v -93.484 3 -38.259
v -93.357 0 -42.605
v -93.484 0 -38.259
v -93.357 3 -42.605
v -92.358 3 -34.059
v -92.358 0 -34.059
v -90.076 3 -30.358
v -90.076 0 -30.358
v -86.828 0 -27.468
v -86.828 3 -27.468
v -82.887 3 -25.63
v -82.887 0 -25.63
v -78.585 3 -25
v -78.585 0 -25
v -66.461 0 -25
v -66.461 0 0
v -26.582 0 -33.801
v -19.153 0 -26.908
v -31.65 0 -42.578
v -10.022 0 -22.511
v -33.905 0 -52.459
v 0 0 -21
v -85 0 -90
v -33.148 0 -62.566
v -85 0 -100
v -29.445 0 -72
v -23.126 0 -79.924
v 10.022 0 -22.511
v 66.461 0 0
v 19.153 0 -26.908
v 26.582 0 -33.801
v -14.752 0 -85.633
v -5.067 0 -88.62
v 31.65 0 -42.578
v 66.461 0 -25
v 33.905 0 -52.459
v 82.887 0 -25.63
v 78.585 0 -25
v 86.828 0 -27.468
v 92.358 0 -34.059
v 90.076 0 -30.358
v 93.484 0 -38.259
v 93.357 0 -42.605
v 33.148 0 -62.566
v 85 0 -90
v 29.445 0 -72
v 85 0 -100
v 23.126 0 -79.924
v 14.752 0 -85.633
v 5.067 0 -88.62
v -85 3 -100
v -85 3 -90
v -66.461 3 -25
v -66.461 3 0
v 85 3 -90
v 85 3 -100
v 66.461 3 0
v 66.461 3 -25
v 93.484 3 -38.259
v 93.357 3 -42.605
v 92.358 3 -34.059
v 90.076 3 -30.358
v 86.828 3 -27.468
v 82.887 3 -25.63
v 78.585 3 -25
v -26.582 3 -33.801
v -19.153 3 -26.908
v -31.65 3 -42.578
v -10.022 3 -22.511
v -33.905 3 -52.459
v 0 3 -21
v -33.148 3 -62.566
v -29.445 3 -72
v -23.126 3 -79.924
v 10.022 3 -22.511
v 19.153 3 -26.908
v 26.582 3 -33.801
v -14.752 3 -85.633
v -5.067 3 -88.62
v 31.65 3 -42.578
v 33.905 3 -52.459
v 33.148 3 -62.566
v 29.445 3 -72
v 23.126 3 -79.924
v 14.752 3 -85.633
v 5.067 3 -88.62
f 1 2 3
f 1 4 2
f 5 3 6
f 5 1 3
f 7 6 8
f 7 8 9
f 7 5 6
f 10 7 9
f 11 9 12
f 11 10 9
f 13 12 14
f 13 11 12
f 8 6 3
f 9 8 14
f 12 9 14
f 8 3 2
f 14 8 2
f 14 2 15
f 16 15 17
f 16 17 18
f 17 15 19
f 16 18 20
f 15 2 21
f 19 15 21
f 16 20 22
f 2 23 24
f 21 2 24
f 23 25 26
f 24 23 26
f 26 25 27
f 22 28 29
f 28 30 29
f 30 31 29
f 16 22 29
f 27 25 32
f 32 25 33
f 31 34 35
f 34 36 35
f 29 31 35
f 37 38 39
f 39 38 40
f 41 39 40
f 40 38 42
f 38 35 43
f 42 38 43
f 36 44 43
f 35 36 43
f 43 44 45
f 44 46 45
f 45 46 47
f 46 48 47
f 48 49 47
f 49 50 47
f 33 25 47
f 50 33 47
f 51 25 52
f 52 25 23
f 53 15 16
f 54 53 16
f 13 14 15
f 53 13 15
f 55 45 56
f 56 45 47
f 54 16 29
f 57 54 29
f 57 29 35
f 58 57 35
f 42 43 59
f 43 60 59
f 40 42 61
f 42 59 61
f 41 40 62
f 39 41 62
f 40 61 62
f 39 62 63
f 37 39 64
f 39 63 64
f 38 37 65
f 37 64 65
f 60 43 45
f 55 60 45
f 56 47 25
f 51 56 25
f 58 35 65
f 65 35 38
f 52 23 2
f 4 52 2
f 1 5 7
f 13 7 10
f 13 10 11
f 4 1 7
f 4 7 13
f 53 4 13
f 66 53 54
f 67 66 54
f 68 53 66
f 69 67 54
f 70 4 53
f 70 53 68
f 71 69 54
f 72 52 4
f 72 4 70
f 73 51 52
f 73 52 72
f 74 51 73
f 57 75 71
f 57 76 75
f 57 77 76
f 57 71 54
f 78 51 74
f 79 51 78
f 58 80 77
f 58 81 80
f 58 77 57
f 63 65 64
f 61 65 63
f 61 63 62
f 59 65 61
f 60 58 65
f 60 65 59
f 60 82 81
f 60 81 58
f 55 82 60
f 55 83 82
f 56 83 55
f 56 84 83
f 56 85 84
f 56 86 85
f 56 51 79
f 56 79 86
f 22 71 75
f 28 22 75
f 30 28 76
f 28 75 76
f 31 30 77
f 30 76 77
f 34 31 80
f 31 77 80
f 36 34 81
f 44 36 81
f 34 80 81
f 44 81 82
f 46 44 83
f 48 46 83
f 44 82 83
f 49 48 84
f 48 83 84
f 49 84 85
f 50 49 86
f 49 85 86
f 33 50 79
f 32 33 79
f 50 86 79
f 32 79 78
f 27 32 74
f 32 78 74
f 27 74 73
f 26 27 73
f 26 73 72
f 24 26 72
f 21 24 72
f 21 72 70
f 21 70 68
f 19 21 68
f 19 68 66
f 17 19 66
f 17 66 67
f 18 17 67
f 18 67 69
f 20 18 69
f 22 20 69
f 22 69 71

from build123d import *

# Parameters (mm, degrees)
BOSS_EXTRUDE1_DEPTH = 3
SKETCH2_R           = 34
CUT_EXTRUDE2_DEPTH  = 12
FILLET1_R           = 15


with BuildPart() as part:
    # Sketch1 → Boss-Extrude1 (new body)
    with BuildSketch(Plane(origin=(0, 0, 0), x_dir=(1, 0, 0), z_dir=(0, 1, 0))):
        Polygon((85, 90), (85, 100), (-85, 100), (-85, 90), (-96.461253746, 25), (-66.461253746, 25), (-66.461253746, 0), (66.461253746, 0), (66.461253746, 25), (96.461253746, 25), align=None)
    extrude(amount=BOSS_EXTRUDE1_DEPTH)

    # Sketch2 → Cut-Extrude2 (cut)
    with BuildSketch(Plane(origin=(0, 3, 0), x_dir=(1, 0, 0), z_dir=(0, 1, 0))):
        with Locations(Location((0, 55, 0), (0, 0, 270))):
            Circle(SKETCH2_R)
    extrude(amount=-CUT_EXTRUDE2_DEPTH, mode=Mode.SUBTRACT)

    # Fillet1
    fillet1_edges = [part.edges().sort_by_distance(p)[0] for p in [
        (-96.461253746, 1.5, -25),
        (96.461253746, 1.5, -25),
    ]]
    fillet(fillet1_edges, radius=FILLET1_R)


solid = part.part
